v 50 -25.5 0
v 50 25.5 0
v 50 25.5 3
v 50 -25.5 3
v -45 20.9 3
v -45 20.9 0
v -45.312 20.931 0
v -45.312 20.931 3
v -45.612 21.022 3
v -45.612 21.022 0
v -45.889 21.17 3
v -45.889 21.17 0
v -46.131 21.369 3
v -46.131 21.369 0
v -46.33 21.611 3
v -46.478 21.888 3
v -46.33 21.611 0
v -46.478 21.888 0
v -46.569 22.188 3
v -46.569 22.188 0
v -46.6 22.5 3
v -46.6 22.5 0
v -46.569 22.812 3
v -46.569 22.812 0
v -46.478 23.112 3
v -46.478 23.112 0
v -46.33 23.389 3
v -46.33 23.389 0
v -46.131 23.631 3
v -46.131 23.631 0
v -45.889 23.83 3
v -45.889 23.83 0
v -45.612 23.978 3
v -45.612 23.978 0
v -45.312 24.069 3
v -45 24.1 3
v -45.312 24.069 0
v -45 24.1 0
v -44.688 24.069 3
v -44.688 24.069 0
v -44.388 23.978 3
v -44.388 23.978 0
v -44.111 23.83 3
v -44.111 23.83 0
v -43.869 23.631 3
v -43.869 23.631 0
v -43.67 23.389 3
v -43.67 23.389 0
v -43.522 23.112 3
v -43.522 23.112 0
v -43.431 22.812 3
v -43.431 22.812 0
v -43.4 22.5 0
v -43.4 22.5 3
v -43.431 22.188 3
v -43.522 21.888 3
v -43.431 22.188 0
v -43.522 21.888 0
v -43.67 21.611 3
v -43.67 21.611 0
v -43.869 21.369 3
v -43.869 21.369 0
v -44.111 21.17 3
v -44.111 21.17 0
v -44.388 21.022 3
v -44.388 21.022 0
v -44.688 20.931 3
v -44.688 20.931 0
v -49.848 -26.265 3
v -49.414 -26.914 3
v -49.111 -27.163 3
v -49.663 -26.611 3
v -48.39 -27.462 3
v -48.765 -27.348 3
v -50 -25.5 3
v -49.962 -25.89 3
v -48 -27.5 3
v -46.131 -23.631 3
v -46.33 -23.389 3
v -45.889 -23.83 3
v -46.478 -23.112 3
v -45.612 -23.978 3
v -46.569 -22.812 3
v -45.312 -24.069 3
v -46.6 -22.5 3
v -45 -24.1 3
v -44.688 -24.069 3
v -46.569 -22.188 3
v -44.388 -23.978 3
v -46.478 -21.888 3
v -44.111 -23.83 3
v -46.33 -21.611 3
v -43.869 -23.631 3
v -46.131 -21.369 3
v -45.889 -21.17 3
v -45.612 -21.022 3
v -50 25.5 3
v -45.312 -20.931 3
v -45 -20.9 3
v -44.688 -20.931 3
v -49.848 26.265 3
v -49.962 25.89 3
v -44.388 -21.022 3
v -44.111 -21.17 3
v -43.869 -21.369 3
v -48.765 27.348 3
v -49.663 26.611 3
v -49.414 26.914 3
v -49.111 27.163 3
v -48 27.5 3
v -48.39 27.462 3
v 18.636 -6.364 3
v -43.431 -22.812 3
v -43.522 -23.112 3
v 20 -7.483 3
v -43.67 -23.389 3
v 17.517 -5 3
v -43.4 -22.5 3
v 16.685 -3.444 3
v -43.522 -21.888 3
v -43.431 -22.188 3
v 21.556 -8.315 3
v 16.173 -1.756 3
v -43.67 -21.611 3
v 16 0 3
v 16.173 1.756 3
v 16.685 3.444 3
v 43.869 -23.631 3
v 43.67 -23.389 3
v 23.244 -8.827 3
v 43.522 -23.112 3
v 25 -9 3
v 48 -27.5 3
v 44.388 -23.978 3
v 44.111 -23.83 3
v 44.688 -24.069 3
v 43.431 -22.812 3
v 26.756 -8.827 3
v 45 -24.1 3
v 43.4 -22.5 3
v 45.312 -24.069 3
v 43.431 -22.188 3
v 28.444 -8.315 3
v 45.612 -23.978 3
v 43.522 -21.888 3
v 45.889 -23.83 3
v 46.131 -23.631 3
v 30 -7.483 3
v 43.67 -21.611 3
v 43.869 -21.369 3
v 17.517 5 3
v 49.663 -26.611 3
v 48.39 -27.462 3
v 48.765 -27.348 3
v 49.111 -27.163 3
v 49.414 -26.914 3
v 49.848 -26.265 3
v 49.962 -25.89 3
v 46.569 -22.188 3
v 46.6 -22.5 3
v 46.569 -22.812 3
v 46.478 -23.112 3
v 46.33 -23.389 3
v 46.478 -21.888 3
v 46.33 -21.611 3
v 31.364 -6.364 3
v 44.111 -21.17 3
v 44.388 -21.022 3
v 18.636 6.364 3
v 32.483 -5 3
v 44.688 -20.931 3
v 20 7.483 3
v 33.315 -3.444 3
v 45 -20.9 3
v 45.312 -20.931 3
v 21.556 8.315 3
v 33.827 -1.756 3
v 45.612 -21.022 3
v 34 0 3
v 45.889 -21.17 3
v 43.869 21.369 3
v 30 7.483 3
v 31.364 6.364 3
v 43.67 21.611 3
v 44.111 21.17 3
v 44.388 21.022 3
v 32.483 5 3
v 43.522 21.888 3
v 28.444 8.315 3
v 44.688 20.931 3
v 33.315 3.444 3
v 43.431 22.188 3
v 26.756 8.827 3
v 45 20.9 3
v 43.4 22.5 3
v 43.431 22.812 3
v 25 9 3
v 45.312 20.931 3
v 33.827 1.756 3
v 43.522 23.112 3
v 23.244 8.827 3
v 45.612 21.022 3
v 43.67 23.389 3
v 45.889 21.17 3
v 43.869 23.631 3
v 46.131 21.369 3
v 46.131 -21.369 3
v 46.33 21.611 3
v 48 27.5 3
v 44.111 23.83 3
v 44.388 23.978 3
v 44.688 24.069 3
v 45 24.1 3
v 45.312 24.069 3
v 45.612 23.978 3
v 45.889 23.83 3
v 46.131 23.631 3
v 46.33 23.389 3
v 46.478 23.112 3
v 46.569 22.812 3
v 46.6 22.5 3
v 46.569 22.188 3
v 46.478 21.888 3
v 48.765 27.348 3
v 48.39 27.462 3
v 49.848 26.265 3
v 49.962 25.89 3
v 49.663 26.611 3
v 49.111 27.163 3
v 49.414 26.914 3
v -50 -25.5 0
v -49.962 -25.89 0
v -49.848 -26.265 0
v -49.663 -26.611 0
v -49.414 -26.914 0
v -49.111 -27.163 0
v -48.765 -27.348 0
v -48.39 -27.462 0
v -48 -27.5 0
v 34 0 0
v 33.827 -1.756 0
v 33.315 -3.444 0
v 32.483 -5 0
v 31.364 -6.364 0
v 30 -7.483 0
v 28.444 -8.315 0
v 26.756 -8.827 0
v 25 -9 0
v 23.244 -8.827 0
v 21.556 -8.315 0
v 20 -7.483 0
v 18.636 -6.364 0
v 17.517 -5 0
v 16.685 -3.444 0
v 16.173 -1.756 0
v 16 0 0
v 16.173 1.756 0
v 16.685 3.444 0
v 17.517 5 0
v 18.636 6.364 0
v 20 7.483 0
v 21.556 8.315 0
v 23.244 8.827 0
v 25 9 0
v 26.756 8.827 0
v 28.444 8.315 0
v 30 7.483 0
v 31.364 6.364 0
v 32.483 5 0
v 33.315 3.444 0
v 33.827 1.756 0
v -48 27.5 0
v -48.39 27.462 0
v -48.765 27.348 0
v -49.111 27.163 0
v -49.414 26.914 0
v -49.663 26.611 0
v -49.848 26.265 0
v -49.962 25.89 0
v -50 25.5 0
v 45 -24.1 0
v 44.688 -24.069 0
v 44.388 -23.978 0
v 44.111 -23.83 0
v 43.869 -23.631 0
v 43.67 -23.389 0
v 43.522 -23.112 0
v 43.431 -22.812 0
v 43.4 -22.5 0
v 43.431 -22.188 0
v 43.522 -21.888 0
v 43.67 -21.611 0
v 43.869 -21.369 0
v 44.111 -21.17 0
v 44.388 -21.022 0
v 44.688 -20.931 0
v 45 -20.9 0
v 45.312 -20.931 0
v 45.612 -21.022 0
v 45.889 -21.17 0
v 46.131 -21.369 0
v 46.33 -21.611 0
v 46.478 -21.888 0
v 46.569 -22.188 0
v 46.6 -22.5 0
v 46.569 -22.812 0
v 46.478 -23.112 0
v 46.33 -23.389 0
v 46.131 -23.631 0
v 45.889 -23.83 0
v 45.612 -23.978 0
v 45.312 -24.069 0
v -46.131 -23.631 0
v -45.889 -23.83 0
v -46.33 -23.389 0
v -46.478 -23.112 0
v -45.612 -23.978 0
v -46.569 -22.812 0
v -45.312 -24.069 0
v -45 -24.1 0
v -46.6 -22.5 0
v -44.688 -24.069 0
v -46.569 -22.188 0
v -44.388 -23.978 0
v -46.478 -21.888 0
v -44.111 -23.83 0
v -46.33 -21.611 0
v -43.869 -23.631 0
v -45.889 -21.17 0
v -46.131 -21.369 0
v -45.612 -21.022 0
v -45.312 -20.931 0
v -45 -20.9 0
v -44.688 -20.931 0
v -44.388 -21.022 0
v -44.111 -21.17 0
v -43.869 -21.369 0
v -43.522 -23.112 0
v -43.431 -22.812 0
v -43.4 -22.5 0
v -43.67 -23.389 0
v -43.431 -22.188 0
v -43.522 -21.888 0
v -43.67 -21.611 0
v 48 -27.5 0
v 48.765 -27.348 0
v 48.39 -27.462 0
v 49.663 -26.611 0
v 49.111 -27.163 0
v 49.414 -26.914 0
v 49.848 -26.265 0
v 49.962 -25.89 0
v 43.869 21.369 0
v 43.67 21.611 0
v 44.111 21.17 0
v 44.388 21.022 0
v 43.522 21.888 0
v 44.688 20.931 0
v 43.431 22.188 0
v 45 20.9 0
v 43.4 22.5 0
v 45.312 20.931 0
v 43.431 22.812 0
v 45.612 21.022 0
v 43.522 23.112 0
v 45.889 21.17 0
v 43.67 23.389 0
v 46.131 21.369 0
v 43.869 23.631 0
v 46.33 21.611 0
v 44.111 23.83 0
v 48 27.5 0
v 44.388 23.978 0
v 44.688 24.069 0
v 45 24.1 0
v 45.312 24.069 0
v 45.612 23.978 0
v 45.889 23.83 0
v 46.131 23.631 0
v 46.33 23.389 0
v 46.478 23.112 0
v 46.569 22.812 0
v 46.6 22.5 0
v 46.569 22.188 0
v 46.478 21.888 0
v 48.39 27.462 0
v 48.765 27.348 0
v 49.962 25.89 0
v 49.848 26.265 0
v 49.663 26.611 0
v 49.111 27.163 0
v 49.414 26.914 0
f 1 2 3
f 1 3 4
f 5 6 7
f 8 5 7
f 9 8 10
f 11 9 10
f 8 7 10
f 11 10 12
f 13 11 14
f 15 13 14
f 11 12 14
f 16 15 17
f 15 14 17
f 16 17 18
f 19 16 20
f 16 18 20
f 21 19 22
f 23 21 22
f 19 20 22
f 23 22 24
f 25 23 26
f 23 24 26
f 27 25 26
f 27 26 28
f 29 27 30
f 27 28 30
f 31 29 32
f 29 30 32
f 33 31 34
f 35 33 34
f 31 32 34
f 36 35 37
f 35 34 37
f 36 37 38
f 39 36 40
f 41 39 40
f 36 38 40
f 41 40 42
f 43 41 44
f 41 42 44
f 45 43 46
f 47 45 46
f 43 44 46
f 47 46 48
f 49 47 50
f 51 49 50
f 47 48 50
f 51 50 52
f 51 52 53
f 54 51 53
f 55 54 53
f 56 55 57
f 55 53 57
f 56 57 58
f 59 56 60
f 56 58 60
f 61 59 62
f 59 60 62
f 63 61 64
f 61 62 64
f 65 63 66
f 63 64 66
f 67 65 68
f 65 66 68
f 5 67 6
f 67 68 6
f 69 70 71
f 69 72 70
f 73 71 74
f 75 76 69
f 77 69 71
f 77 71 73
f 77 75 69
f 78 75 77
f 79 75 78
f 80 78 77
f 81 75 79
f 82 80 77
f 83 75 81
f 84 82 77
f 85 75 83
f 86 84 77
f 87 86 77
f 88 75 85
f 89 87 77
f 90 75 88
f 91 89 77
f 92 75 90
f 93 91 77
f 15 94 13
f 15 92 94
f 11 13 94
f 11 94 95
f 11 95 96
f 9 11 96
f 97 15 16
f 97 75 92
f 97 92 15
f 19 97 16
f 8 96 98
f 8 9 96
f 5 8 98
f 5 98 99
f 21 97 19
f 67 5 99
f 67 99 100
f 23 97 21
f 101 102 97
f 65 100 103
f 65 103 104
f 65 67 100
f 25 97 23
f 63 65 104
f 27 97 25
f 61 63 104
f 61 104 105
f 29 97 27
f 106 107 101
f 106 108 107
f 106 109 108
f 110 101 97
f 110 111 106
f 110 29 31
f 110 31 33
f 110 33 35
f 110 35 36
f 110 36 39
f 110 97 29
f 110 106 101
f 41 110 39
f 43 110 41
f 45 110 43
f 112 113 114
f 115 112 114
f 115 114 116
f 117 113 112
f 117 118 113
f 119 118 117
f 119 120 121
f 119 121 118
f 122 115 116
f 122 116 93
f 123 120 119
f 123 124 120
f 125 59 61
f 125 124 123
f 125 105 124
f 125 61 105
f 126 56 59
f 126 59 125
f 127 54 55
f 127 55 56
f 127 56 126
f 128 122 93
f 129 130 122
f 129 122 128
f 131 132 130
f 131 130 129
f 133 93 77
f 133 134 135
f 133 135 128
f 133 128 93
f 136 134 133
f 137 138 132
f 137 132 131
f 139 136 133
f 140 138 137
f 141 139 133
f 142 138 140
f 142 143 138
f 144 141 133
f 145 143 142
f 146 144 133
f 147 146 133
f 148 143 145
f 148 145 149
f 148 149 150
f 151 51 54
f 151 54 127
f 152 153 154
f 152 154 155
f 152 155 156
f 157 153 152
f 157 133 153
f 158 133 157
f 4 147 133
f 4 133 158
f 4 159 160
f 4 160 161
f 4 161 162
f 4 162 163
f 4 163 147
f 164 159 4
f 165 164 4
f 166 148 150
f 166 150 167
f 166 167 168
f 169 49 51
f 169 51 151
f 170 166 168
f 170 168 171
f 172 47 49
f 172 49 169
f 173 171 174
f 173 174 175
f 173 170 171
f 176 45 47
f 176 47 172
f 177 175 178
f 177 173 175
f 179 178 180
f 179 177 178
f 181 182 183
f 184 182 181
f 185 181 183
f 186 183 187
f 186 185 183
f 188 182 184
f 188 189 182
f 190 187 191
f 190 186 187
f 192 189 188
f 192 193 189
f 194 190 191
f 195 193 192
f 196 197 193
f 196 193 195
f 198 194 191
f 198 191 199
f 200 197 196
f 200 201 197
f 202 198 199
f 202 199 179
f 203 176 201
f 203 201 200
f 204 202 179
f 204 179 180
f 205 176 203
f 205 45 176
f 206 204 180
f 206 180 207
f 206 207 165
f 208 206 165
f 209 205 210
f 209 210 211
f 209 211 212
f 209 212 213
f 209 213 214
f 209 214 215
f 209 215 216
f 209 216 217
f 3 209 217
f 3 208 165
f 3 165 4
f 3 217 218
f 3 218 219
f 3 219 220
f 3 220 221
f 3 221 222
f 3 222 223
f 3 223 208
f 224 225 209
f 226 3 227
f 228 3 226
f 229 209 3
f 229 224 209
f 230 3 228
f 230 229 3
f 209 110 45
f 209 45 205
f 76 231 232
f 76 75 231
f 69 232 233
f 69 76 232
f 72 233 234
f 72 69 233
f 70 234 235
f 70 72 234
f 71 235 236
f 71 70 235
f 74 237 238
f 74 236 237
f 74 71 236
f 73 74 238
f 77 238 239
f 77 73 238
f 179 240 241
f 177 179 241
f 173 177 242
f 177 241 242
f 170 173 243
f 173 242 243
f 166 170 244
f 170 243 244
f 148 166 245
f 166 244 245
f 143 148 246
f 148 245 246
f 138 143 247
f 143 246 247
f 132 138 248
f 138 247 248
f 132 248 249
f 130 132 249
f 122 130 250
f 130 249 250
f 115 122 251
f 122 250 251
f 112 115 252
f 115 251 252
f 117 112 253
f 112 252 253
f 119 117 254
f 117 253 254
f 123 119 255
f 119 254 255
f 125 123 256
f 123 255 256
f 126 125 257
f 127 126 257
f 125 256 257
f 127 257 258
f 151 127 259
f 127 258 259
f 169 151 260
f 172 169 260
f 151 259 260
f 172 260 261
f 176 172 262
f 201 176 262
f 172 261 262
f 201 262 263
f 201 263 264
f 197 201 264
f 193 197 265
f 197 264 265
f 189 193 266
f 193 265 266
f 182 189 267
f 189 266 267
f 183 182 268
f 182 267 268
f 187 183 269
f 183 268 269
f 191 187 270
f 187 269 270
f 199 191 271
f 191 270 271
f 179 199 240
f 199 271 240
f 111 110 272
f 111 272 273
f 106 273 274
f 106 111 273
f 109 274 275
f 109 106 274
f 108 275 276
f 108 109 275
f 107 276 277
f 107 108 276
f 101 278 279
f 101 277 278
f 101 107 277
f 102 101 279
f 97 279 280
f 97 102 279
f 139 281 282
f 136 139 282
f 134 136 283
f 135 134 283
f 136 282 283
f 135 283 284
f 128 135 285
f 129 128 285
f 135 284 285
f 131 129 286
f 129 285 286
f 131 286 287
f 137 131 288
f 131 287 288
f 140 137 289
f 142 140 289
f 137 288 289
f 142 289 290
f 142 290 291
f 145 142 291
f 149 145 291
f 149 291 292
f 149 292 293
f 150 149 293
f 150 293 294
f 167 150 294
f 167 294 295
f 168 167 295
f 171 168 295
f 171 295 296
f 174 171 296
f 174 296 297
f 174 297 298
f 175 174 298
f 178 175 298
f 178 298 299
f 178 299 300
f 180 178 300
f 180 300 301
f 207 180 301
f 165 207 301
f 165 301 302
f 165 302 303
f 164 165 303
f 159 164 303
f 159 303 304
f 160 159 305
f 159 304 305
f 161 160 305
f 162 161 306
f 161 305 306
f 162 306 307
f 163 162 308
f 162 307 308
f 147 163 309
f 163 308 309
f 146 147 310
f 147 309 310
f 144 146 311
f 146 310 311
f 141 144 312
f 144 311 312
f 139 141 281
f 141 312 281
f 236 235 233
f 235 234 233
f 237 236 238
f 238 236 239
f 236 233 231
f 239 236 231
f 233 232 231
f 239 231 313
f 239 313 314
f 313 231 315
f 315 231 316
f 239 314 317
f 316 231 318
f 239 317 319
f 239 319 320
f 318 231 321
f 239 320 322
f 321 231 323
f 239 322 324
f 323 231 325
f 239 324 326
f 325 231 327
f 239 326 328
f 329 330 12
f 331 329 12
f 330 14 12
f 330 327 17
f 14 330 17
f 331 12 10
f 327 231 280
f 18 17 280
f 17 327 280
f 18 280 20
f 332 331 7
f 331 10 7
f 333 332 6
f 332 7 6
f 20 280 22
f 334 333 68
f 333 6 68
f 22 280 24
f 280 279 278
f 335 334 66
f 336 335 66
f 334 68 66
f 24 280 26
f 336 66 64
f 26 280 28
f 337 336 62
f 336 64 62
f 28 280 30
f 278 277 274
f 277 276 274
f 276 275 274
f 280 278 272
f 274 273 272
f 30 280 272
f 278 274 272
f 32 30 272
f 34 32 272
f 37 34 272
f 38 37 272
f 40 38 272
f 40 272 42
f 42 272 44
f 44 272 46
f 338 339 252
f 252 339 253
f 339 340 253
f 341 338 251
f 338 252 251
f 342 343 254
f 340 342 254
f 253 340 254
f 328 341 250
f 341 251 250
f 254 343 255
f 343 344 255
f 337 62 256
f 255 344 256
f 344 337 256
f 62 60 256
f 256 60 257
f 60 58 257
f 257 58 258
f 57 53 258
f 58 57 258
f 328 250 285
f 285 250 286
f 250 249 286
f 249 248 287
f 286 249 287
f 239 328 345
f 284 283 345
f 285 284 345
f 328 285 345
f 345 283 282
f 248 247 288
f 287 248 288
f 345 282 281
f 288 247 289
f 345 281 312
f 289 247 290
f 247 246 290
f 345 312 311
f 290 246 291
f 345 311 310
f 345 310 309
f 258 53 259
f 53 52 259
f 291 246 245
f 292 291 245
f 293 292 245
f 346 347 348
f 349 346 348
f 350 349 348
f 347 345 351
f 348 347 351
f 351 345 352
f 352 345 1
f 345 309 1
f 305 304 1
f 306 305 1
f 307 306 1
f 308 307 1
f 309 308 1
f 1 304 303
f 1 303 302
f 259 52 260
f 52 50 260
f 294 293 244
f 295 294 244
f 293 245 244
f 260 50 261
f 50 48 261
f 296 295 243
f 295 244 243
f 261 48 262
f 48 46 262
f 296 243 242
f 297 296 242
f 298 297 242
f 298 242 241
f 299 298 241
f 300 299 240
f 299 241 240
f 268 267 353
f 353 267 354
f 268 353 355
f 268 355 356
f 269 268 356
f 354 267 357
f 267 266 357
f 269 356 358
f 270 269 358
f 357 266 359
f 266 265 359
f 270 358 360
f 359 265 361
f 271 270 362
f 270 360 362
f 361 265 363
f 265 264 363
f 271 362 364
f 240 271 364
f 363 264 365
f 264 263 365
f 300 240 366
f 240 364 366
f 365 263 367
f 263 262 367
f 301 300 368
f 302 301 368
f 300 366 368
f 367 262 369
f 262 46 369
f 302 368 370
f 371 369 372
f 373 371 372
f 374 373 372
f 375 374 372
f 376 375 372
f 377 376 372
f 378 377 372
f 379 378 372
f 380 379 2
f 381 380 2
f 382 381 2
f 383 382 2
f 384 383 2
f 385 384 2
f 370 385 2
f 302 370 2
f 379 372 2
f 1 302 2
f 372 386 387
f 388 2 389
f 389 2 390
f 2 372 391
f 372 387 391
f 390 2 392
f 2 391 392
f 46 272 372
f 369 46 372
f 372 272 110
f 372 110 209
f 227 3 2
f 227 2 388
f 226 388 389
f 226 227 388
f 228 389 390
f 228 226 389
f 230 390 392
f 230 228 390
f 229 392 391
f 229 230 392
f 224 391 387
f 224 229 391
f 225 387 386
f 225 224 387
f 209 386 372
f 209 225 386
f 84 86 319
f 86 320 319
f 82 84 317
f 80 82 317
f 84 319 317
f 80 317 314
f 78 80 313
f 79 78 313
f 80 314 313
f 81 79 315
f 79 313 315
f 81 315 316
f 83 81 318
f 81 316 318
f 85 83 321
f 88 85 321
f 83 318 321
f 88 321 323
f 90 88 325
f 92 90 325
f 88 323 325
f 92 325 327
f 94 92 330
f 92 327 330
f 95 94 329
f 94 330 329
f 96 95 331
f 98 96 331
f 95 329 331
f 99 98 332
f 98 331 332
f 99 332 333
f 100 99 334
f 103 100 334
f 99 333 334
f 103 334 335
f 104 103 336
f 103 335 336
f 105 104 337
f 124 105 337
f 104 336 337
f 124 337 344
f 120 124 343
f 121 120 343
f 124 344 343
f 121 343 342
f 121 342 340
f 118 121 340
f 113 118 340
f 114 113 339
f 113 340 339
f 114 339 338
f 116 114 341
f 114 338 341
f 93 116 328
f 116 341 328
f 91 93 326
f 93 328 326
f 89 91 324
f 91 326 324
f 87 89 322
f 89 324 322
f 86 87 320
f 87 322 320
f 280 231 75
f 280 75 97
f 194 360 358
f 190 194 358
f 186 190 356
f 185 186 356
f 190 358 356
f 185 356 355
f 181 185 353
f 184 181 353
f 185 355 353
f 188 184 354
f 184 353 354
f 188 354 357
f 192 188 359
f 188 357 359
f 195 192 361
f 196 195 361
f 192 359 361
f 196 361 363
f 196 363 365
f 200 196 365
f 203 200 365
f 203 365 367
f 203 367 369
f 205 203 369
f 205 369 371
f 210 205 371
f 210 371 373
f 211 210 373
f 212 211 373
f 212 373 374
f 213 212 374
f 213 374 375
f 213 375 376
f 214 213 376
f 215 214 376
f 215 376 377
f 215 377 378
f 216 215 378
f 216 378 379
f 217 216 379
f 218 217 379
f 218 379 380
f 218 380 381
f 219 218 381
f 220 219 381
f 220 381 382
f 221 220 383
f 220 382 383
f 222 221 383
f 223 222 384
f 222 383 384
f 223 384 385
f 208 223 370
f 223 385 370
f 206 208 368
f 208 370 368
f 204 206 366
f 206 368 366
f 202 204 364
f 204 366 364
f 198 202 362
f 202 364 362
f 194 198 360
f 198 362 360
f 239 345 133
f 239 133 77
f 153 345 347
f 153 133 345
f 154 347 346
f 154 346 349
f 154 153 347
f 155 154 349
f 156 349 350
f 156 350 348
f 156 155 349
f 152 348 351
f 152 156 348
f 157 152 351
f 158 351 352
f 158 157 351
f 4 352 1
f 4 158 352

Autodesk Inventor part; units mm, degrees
ref_plane "YZ Plane" through (0, 0, 0) normal (1, 0, 0) x (0, 1, 0)
ref_plane "XZ Plane" through (0, 0, 0) normal (0, 1, 0) x (-1, 0, 0)
ref_plane "XY Plane" through (0, 0, 0) normal (0, 0, 1) x (1, 0, 0)
sketch "スケッチ1" plane through (0, 0, 0) normal (0, 0, 1) x (1, 0, 0)
  line L0 (50, -27.5) -> (-50, -27.5)
  line L1 (-50, -27.5) -> (-50, 27.5)
  line L2 (-50, 27.5) -> (50, 27.5)
  line L3 (50, 27.5) -> (50, -27.5)
  line L4 (50, -27.5) -> (-50, 27.5) construction
  line L5 (-50, -27.5) -> (50, 27.5) construction
  circle A0 centre (0, 0) radius 25
  line L6 (-50, 0) -> (50, 0)
  circle A1 centre (25, 0) radius 9
  circle A2 centre (-25, 0) radius 12.5
  circle A3 centre (-25, 0) radius 17.5
  circle A4 centre (-25, 17.5) radius 2.05
  circle A5 centre (-42.5, 0) radius 2.05
  circle A6 centre (-25, -17.5) radius 2.05
  circle A7 centre (-7.5, 0) radius 2.05
  dimension "d5" = 35
  dimension "d0" = 100
  dimension "d1" = 55
  dimension "d2" = 50
  dimension "d3" = 18
  dimension "d4" = 25
  dimension "d6" = 4.1
  dimension "d9" = 360
  dimension "d11" = 25
extrude "押し出し1" add sketch "スケッチ1" along normal blind 3 contours L0 L1 L6 A5 A3 A6 A0 A1 L3 | L6 A1 A0 A3 A4 A5 L1 L2 L3 | A5 A3 L6 | L6 A3 A5 | A1 L6 A7 A3 A0 | A0 A3 A7 L6 A1 | A3 A5 L6 | L6 A5 A3 | A3 A4 A0 A2 L6 A5 | A5 L6 A2 A0 A3 A6 | A3 A7 L6 A2 A0 | A0 A2 L6 A7 A3 | A4 A3 | A3 A4 | A6 A3 | A3 A6 | A7 A3 L6 | L6 A3 A7 | A2 L6 A0 | A0 L6 A2 | A3 L6 A7 | A2 L6 A0 | A0 L6 A2 | A7 L6 A3
sketch "スケッチ2" plane through (0, 0, 3) normal (0, 0, 1) x (1, 0, 0)
  line L0 (50, 27.5) -> (-50, 27.5) projected
  line L1 (-50, 27.5) -> (-50, -27.5) projected
  line L2 (-50, -27.5) -> (50, -27.5) projected
  line L3 (50, -27.5) -> (50, 27.5) projected
  circle A0 centre (25, 0) radius 9 projected
  line L4 (-45, 22.5) -> (45, 22.5)
  line L5 (45, 22.5) -> (45, -22.5)
  line L6 (45, -22.5) -> (-45, -22.5)
  line L7 (-45, -22.5) -> (-45, 22.5)
  point P0 (0, 0)
  dimension "d14" = 5
hole "穴1" at (-45, 22.5, 3) at (-45, -22.5, 3) at (45, -22.5, 3) at (45, 22.5, 3) direction (0, 0, -1) diameter 3.2 end through all
fillet "フィレット1" radius 2 4 edges at (-50, 27.5, 1.5) (50, 27.5, 1.5) (50, -27.5, 1.5) (-50, -27.5, 1.5)
sketch "スケッチ3" plane through (0, 0, 3) normal (0, 0, 1) x (1, 0, 0)
  arc A0 (-50, -25.5) -> (-48, -27.5) centre (-48, -25.5) ccw projected
  line L0 (-48, -27.5) -> (48, -27.5) projected
  arc A1 (48, -27.5) -> (50, -25.5) centre (48, -25.5) ccw projected
  line L1 (50, -25.5) -> (50, 25.5) projected
  arc A2 (50, 25.5) -> (48, 27.5) centre (48, 25.5) ccw projected
  line L2 (48, 27.5) -> (-48, 27.5) projected
  arc A3 (-48, 27.5) -> (-50, 25.5) centre (-48, 25.5) ccw projected
  line L3 (-50, 25.5) -> (-50, -25.5) projected
  circle A4 centre (45, 22.5) radius 1.6 projected
  circle A5 centre (45, -22.5) radius 1.6 projected
  circle A6 centre (-45, -22.5) radius 1.6 projected
  circle A7 centre (-45, 22.5) radius 1.6 projected
  circle A8 centre (25, 0) radius 9 projected
  point P0 (0, 0)
equation "\"d11\" = -0.5 * d2 + 0.5 * d0"
properties part number "xx_plate_nomotor"
